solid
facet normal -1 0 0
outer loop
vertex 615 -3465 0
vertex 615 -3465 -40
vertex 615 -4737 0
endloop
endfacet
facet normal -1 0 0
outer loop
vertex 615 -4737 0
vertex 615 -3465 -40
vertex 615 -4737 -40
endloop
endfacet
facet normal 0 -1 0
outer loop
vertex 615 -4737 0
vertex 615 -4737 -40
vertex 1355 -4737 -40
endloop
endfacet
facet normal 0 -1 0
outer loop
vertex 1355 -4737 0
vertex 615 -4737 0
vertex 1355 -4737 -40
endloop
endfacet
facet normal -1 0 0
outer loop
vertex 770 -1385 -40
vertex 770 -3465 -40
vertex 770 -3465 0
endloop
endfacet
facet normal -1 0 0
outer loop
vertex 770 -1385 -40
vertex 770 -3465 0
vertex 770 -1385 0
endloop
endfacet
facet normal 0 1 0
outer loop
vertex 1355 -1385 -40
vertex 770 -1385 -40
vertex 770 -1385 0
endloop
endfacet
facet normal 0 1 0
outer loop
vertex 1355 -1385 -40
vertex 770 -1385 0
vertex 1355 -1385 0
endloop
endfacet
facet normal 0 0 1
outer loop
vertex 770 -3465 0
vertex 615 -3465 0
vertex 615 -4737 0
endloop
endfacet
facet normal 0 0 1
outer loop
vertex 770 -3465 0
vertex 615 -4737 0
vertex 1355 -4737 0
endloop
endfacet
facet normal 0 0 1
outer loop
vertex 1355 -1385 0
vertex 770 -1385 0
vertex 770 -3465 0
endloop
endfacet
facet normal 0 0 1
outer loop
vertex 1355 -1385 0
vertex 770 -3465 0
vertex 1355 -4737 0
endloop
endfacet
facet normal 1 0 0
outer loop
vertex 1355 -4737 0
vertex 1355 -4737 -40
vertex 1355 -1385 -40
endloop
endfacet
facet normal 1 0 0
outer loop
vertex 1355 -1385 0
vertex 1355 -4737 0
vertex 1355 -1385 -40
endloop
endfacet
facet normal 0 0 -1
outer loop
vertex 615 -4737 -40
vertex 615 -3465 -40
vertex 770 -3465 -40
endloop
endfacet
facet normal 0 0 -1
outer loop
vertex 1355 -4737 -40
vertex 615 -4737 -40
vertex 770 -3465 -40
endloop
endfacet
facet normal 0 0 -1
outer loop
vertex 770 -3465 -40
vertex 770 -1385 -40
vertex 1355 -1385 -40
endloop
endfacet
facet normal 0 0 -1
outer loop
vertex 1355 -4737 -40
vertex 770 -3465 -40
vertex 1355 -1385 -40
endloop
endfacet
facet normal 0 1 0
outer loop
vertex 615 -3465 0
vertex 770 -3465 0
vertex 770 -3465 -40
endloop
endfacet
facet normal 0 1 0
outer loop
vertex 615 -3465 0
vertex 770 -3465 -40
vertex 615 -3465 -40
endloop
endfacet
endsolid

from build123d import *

# Parameters (mm, degrees)
TABAN_FLAN_1_DEPTH         = 40
KES_EKSTR_ZYON1_DEPTH      = 6158.209189235
KES_EKSTR_ZYON1_DEPTH_BACK = 6158.209189235
IZIM2_W                    = 1360
IZIM2_H                    = 355
KES_EKSTR_ZYON2_DEPTH      = 6158.209189235
KES_EKSTR_ZYON2_DEPTH_BACK = 6158.209189235
IZIM3_W                    = 365
IZIM3_H                    = 3110
IZIM3_W_2                  = 5
IZIM3_H_2                  = 5650
KES_EKSTR_ZYON3_DEPTH      = 6157.106724221
KES_EKSTR_ZYON3_DEPTH_BACK = 6157.106724221
IZIM4_W                    = 405
IZIM4_H                    = 3110
KES_EKSTR_ZYON4_DEPTH      = 6157.106724221
KES_EKSTR_ZYON4_DEPTH_BACK = 6157.106724221
KES_EKSTR_ZYON5_DEPTH      = 4928.148668348
KES_EKSTR_ZYON5_DEPTH_BACK = 4928.148668348
IZIM6_W                    = 585
IZIM6_H                    = 1030


# Sheet-metal steps are written as plain solids
with BuildPart() as part:
    # Çizim1 → Taban-Flanş1 (new body)
    with BuildSketch(Plane.XY):
        Polygon((0, 0), (0, -3465), (-660, -3465), (-660, -6005), (1360, -6005), (1360, 0), align=None)
    extrude(amount=-TABAN_FLAN_1_DEPTH)

    # Çizim2 → Kes-Ekstrüzyon1 (cut, two sides: drawn at the far end of the back side and taken through both)
    with BuildSketch(Plane.XY.offset(-KES_EKSTR_ZYON1_DEPTH_BACK)):
        with Locations((680, -177.5)):
            Rectangle(IZIM2_W, IZIM2_H)
    extrude(amount=KES_EKSTR_ZYON1_DEPTH + KES_EKSTR_ZYON1_DEPTH_BACK, mode=Mode.SUBTRACT)

    # Çizim3 → Kes-Ekstrüzyon2 (cut, two sides: drawn at the far end of the back side and taken through both)
    with BuildSketch(Plane.XY.offset(-KES_EKSTR_ZYON2_DEPTH_BACK)):
        with Locations((182.5, -1910)):
            Rectangle(IZIM3_W, IZIM3_H)
        with Locations((1357.5, -3180)):
            Rectangle(IZIM3_W_2, IZIM3_H_2)
    extrude(amount=KES_EKSTR_ZYON2_DEPTH + KES_EKSTR_ZYON2_DEPTH_BACK, mode=Mode.SUBTRACT)

    # Çizim4 → Kes-Ekstrüzyon3 (cut, two sides: drawn at the far end of the back side and taken through both)
    with BuildSketch(Plane.XY.offset(-KES_EKSTR_ZYON3_DEPTH_BACK)):
        with Locations((567.5, -1910)):
            Rectangle(IZIM4_W, IZIM4_H)
    extrude(amount=KES_EKSTR_ZYON3_DEPTH + KES_EKSTR_ZYON3_DEPTH_BACK, mode=Mode.SUBTRACT)

    # Çizim5 → Kes-Ekstrüzyon4 (cut, two sides: drawn at the far end of the back side and taken through both)
    with BuildSketch(Plane.XY.offset(-KES_EKSTR_ZYON4_DEPTH_BACK)):
        Polygon((615, -3465), (615, -4737), (1355, -4737), (1355, -6005), (-660, -6005), (-660, -3465), align=None)
    extrude(amount=KES_EKSTR_ZYON4_DEPTH + KES_EKSTR_ZYON4_DEPTH_BACK, mode=Mode.SUBTRACT)

    # Çizim6 → Kes-Ekstrüzyon5 (cut, two sides: drawn at the far end of the back side and taken through both)
    with BuildSketch(Plane.XY.offset(-KES_EKSTR_ZYON5_DEPTH_BACK)):
        with Locations((1062.5, -870)):
            Rectangle(IZIM6_W, IZIM6_H)
    extrude(amount=KES_EKSTR_ZYON5_DEPTH + KES_EKSTR_ZYON5_DEPTH_BACK, mode=Mode.SUBTRACT)


solid = part.part
